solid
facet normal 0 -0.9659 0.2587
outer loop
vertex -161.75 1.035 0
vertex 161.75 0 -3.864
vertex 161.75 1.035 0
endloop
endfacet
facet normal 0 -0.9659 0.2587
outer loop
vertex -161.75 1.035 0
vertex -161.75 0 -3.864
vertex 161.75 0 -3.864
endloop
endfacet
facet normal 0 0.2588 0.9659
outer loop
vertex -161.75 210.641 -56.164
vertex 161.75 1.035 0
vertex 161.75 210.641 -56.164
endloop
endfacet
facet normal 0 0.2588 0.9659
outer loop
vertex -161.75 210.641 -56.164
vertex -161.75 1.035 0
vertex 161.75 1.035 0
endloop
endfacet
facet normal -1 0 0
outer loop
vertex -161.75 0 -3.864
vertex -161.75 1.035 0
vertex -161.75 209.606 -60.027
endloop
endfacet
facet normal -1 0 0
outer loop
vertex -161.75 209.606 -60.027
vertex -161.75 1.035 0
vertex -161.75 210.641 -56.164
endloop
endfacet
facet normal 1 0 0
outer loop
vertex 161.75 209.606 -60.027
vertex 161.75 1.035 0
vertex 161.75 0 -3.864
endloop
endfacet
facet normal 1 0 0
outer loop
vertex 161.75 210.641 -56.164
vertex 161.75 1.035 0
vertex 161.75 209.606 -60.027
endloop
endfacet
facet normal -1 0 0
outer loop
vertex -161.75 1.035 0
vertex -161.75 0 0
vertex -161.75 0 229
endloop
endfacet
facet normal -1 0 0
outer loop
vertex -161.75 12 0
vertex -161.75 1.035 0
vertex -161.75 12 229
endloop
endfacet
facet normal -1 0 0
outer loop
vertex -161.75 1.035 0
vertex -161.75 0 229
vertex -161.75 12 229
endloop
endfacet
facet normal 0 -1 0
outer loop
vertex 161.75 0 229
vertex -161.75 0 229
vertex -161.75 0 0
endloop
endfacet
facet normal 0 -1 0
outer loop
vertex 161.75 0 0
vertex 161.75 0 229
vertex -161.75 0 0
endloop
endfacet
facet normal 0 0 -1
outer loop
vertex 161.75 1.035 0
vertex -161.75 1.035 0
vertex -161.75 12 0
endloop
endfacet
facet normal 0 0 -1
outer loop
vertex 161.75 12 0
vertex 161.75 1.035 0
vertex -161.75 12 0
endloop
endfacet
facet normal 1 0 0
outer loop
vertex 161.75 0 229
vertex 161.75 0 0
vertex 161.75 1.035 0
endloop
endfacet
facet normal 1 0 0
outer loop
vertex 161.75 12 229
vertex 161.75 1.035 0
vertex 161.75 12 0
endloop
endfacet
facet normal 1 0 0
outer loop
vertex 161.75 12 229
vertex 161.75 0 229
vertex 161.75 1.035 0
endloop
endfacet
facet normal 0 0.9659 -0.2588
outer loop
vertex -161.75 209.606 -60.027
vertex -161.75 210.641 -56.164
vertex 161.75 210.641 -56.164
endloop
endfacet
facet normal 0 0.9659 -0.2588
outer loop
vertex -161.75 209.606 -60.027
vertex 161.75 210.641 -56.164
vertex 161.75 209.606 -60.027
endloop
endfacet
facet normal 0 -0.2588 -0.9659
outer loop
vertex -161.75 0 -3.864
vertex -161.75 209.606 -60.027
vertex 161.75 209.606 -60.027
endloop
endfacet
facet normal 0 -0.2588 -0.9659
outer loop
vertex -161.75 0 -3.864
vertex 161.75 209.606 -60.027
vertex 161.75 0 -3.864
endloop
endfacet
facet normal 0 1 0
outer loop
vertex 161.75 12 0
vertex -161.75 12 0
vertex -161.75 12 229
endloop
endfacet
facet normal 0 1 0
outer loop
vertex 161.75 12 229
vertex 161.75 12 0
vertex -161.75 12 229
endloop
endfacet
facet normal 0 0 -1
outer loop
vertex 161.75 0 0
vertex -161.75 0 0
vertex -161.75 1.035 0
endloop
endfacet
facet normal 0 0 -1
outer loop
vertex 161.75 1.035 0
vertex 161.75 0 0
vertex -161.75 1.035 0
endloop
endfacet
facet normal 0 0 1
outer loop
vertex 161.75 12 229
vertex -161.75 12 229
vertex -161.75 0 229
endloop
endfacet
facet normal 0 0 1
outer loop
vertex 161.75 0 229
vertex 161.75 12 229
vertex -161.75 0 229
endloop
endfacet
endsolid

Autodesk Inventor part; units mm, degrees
ref_plane "YZ Plane" through (0, 0, 0) normal (1, 0, 0) x (0, 1, 0)
ref_plane "XZ Plane" through (0, 0, 0) normal (0, 1, 0) x (-1, 0, 0)
ref_plane "XY Plane" through (0, 0, 0) normal (0, 0, 1) x (1, 0, 0)
sketch "Sketch1" plane through (0, 0, 0) normal (1, 0, 0) x (0, 1, 0)
  line L0 (1.0353, 0) -> (210.6412, -56.1637)
  line L1 (210.6412, -56.1637) -> (209.6059, -60.0274)
  line L2 (209.6059, -60.0274) -> (0, -3.8637)
  line L3 (0, -3.8637) -> (1.0353, 0)
  line L4 (0, -72.0329) -> (0, 12.0055) construction
  line L5 (-42.1282, 0) -> (252.7694, 0) construction
  point P0 (0, 0)
  dimension "d0" = 217
  dimension "d1" = 4
  dimension "d2" = 75
extrude "Extrusion1" add sketch "Sketch1" along normal mid plane 323.5
sketch "Sketch2" plane through (0, 0, 0) normal (1, 0, 0) x (0, 1, 0)
  line L0 (0, 0) -> (12, 0)
  line L1 (12, 0) -> (12, 229)
  line L2 (12, 229) -> (0, 229)
  line L3 (0, 229) -> (0, 0)
  dimension "d5" = 229
  dimension "d6" = 12
extrude "Extrusion2" add sketch "Sketch2" along normal mid plane 323.5
properties part number "laptop" material "PC/ABS Plastic"
